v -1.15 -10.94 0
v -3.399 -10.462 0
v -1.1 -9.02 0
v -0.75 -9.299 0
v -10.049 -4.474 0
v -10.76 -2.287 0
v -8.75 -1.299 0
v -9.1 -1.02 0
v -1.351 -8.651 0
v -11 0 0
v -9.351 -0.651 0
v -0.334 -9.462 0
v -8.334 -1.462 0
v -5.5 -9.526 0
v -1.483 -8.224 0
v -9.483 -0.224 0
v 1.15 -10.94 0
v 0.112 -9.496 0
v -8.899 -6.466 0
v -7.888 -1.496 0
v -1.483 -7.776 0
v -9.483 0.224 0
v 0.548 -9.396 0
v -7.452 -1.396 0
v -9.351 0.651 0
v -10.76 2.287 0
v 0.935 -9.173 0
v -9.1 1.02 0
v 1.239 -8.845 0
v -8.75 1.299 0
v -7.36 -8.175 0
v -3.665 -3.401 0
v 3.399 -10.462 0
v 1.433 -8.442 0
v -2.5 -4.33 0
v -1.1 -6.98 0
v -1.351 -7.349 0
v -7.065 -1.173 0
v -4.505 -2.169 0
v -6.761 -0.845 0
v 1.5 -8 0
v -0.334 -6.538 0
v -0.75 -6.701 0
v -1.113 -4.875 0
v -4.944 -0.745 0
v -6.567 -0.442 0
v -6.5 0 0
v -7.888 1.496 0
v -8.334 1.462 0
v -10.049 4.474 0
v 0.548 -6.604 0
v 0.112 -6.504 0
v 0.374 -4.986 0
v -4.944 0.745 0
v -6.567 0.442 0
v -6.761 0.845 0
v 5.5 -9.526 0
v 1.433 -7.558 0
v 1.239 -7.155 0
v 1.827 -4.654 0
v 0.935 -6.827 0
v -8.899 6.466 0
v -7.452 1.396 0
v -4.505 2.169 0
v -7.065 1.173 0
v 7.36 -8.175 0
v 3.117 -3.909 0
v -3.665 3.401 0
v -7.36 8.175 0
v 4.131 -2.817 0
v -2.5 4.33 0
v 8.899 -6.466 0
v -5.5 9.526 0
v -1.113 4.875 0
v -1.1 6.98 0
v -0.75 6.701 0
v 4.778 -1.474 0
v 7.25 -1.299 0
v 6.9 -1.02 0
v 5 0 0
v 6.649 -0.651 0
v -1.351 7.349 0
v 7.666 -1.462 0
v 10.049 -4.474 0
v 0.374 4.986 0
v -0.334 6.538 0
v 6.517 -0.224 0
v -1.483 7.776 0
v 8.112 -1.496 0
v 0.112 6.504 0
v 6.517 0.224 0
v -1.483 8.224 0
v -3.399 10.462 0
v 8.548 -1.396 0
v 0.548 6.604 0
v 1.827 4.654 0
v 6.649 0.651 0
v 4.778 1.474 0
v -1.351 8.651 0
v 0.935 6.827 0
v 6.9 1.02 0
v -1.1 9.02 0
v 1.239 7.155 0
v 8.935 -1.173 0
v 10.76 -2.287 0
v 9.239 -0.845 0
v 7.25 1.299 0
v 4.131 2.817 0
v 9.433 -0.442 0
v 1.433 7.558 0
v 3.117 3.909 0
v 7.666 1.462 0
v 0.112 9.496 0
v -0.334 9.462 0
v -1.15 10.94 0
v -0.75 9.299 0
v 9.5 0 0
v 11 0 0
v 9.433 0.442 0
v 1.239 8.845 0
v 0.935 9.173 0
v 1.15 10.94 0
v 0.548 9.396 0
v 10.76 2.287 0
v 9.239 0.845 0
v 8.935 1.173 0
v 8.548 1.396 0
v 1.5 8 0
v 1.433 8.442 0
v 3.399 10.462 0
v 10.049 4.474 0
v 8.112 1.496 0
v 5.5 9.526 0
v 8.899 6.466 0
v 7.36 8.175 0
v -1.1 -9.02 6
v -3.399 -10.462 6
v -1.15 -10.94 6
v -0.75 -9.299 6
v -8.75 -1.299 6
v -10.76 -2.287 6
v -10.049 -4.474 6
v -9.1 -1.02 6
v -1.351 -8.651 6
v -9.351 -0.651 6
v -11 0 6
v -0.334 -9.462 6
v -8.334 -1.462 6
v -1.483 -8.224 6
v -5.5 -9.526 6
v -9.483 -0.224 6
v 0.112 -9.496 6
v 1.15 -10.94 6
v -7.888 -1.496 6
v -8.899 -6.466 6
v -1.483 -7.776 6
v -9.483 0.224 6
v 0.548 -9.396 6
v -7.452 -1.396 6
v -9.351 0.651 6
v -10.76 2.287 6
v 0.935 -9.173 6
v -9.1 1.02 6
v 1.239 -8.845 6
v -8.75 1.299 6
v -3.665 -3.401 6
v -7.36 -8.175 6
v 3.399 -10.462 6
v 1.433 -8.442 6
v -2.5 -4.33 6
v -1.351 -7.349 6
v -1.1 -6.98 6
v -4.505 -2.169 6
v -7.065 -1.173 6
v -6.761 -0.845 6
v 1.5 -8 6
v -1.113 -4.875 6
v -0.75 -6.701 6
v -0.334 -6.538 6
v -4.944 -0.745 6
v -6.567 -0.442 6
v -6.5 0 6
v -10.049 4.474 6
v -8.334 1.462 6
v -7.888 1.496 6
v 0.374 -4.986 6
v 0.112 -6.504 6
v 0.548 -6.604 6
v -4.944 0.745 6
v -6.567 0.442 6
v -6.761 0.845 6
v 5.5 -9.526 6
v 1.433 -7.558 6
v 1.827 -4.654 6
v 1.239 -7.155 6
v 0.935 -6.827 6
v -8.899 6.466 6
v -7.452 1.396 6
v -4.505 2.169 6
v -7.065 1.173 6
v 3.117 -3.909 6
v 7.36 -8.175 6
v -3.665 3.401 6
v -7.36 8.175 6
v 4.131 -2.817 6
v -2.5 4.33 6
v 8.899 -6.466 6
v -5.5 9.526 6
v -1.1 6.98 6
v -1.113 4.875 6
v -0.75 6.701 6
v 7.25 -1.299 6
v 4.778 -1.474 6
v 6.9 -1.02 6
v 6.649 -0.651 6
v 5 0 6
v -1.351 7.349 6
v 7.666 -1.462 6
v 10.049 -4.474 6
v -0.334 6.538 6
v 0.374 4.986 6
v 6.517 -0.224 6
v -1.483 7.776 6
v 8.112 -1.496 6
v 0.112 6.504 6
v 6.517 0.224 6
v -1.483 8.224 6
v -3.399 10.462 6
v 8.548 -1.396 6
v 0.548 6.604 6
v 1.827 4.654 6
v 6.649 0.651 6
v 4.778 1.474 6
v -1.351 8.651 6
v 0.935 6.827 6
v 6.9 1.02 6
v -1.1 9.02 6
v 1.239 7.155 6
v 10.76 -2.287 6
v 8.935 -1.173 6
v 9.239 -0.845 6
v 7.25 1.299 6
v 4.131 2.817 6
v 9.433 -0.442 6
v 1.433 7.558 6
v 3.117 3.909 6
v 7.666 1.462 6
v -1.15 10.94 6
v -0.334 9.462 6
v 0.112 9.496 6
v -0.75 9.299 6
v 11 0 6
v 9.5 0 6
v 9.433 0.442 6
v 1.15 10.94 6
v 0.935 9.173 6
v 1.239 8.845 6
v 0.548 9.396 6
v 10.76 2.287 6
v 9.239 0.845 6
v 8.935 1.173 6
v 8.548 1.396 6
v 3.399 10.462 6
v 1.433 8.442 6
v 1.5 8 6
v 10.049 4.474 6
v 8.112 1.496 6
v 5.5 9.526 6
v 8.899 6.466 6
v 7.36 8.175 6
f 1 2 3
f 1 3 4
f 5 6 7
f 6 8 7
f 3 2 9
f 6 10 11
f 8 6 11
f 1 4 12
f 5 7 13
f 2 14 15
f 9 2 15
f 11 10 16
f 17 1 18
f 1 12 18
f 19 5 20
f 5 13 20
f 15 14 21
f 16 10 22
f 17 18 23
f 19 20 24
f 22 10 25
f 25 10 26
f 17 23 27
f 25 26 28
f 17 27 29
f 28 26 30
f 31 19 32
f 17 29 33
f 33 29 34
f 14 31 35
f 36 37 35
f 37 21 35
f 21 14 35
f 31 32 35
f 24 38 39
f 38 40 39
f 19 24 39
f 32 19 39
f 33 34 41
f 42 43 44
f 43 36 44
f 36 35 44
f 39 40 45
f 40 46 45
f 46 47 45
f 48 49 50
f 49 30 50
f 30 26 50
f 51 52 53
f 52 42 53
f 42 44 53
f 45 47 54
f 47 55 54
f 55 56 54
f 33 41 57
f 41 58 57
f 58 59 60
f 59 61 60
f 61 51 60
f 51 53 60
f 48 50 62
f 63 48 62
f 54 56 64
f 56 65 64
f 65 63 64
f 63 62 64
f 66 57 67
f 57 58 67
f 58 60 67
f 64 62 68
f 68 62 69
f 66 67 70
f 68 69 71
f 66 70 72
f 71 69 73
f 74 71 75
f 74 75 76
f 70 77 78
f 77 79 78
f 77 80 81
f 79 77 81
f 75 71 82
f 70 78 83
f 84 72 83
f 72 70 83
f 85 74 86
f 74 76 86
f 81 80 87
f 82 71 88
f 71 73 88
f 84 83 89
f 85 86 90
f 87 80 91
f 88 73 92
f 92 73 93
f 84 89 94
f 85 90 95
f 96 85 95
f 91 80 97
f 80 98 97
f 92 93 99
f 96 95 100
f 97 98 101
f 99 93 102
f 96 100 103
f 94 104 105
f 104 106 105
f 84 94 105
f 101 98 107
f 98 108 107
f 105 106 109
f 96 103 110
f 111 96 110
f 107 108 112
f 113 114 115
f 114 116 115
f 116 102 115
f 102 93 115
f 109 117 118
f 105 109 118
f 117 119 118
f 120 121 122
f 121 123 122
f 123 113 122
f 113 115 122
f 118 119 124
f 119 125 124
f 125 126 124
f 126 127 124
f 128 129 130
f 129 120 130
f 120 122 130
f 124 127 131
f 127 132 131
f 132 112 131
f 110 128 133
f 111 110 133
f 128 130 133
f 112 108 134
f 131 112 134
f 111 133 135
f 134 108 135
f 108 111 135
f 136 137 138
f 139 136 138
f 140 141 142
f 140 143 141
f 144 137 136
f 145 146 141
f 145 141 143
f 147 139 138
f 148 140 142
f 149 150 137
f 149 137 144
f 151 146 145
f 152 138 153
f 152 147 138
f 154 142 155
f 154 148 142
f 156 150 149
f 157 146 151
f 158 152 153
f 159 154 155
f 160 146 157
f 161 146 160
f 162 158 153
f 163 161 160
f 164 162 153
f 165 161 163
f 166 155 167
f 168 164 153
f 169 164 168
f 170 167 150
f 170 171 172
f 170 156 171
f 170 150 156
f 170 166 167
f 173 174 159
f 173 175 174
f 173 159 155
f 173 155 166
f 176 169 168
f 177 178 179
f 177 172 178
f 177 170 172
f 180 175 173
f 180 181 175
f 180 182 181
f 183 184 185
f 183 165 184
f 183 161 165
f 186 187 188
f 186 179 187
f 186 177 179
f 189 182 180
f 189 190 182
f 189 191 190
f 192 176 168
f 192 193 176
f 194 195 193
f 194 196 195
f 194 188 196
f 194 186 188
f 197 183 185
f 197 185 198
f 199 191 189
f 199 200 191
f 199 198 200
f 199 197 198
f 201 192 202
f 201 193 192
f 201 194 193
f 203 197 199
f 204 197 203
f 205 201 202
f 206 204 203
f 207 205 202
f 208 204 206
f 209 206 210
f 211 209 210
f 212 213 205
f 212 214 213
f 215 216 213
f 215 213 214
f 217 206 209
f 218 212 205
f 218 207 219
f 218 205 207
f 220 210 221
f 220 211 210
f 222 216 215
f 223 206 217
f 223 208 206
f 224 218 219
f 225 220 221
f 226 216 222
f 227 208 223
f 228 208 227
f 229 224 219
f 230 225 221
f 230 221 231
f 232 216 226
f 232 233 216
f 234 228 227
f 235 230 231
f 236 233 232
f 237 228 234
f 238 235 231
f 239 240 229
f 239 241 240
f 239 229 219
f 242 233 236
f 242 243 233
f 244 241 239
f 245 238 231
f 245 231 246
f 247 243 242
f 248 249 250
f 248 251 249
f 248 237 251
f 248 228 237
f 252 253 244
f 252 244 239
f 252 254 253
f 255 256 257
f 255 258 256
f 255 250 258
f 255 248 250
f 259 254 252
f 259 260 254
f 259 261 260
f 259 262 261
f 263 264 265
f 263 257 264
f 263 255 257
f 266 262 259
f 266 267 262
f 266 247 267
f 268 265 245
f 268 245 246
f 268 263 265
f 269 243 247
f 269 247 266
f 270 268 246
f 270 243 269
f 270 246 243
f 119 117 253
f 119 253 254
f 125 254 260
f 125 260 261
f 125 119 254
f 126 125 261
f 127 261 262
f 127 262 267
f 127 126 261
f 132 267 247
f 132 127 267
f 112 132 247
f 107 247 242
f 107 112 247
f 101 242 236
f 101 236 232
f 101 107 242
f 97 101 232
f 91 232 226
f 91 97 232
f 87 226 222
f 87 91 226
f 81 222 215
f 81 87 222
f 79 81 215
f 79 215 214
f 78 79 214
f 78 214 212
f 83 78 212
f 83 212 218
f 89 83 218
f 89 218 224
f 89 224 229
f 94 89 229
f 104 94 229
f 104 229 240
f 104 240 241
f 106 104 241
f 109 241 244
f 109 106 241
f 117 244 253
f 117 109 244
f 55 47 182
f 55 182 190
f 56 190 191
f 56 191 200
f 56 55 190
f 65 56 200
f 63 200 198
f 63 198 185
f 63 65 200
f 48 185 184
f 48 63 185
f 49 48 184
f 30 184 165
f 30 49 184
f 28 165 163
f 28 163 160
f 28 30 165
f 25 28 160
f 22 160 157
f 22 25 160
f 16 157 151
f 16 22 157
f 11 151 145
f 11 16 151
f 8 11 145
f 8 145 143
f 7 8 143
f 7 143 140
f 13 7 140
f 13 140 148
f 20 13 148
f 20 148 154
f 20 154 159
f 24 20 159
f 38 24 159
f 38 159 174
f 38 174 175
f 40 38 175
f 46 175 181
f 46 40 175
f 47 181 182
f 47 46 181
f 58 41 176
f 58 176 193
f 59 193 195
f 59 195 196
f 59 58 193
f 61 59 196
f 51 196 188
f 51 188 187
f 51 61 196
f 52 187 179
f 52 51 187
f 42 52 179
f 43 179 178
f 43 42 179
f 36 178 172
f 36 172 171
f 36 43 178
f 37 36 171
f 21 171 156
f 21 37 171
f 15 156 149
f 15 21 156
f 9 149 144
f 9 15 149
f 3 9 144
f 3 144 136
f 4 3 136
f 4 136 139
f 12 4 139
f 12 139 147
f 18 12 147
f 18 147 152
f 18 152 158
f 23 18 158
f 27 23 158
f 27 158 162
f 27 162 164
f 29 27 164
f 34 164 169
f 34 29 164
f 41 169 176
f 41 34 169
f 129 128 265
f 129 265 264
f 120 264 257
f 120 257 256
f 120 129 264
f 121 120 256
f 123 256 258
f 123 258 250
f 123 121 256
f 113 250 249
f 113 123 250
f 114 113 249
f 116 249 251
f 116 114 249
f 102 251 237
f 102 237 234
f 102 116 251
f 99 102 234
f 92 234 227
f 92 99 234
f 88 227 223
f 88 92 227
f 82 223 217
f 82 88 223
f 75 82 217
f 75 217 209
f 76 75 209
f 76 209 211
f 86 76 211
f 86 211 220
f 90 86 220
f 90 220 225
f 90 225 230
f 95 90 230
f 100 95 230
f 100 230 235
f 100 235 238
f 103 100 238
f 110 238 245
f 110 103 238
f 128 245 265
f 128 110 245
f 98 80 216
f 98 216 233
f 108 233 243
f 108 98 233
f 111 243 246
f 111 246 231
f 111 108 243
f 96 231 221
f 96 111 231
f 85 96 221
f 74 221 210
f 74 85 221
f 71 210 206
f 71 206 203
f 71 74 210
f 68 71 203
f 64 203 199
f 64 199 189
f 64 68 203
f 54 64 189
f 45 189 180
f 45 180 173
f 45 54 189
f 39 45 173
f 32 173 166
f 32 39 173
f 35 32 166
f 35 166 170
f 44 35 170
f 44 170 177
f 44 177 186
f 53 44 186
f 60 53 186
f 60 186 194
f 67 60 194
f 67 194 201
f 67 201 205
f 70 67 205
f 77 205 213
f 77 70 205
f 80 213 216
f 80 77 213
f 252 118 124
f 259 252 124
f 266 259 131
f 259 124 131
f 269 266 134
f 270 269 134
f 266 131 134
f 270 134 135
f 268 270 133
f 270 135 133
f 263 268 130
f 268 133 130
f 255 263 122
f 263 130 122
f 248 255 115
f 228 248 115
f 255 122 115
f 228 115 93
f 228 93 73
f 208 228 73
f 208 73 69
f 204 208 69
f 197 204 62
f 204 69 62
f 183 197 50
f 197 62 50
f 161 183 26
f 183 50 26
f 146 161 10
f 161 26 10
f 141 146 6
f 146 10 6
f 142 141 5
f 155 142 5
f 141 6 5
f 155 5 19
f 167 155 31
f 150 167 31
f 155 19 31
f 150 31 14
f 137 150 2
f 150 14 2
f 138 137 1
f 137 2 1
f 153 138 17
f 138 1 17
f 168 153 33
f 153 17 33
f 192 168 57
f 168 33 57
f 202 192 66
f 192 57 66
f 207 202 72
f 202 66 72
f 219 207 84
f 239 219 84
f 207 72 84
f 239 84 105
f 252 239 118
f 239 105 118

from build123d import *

# Parameters (mm, degrees)
SKETCH_R   = 11
SKETCH_R_2 = 1.5
SKETCH_R_3 = 5
PAD_DEPTH  = 6


with BuildPart() as part:
    # Sketch → Pad (new body)
    with BuildSketch(Plane.XY):
        Circle(SKETCH_R)
        with Locations((0, 8)):
            Circle(SKETCH_R_2, mode=Mode.SUBTRACT)
        with Locations((-8, 0)):
            Circle(SKETCH_R_2, mode=Mode.SUBTRACT)
        with Locations((0, -8)):
            Circle(SKETCH_R_2, mode=Mode.SUBTRACT)
        with Locations((8, 0)):
            Circle(SKETCH_R_2, mode=Mode.SUBTRACT)
        Circle(SKETCH_R_3, mode=Mode.SUBTRACT)
    extrude(amount=PAD_DEPTH)


solid = part.part
